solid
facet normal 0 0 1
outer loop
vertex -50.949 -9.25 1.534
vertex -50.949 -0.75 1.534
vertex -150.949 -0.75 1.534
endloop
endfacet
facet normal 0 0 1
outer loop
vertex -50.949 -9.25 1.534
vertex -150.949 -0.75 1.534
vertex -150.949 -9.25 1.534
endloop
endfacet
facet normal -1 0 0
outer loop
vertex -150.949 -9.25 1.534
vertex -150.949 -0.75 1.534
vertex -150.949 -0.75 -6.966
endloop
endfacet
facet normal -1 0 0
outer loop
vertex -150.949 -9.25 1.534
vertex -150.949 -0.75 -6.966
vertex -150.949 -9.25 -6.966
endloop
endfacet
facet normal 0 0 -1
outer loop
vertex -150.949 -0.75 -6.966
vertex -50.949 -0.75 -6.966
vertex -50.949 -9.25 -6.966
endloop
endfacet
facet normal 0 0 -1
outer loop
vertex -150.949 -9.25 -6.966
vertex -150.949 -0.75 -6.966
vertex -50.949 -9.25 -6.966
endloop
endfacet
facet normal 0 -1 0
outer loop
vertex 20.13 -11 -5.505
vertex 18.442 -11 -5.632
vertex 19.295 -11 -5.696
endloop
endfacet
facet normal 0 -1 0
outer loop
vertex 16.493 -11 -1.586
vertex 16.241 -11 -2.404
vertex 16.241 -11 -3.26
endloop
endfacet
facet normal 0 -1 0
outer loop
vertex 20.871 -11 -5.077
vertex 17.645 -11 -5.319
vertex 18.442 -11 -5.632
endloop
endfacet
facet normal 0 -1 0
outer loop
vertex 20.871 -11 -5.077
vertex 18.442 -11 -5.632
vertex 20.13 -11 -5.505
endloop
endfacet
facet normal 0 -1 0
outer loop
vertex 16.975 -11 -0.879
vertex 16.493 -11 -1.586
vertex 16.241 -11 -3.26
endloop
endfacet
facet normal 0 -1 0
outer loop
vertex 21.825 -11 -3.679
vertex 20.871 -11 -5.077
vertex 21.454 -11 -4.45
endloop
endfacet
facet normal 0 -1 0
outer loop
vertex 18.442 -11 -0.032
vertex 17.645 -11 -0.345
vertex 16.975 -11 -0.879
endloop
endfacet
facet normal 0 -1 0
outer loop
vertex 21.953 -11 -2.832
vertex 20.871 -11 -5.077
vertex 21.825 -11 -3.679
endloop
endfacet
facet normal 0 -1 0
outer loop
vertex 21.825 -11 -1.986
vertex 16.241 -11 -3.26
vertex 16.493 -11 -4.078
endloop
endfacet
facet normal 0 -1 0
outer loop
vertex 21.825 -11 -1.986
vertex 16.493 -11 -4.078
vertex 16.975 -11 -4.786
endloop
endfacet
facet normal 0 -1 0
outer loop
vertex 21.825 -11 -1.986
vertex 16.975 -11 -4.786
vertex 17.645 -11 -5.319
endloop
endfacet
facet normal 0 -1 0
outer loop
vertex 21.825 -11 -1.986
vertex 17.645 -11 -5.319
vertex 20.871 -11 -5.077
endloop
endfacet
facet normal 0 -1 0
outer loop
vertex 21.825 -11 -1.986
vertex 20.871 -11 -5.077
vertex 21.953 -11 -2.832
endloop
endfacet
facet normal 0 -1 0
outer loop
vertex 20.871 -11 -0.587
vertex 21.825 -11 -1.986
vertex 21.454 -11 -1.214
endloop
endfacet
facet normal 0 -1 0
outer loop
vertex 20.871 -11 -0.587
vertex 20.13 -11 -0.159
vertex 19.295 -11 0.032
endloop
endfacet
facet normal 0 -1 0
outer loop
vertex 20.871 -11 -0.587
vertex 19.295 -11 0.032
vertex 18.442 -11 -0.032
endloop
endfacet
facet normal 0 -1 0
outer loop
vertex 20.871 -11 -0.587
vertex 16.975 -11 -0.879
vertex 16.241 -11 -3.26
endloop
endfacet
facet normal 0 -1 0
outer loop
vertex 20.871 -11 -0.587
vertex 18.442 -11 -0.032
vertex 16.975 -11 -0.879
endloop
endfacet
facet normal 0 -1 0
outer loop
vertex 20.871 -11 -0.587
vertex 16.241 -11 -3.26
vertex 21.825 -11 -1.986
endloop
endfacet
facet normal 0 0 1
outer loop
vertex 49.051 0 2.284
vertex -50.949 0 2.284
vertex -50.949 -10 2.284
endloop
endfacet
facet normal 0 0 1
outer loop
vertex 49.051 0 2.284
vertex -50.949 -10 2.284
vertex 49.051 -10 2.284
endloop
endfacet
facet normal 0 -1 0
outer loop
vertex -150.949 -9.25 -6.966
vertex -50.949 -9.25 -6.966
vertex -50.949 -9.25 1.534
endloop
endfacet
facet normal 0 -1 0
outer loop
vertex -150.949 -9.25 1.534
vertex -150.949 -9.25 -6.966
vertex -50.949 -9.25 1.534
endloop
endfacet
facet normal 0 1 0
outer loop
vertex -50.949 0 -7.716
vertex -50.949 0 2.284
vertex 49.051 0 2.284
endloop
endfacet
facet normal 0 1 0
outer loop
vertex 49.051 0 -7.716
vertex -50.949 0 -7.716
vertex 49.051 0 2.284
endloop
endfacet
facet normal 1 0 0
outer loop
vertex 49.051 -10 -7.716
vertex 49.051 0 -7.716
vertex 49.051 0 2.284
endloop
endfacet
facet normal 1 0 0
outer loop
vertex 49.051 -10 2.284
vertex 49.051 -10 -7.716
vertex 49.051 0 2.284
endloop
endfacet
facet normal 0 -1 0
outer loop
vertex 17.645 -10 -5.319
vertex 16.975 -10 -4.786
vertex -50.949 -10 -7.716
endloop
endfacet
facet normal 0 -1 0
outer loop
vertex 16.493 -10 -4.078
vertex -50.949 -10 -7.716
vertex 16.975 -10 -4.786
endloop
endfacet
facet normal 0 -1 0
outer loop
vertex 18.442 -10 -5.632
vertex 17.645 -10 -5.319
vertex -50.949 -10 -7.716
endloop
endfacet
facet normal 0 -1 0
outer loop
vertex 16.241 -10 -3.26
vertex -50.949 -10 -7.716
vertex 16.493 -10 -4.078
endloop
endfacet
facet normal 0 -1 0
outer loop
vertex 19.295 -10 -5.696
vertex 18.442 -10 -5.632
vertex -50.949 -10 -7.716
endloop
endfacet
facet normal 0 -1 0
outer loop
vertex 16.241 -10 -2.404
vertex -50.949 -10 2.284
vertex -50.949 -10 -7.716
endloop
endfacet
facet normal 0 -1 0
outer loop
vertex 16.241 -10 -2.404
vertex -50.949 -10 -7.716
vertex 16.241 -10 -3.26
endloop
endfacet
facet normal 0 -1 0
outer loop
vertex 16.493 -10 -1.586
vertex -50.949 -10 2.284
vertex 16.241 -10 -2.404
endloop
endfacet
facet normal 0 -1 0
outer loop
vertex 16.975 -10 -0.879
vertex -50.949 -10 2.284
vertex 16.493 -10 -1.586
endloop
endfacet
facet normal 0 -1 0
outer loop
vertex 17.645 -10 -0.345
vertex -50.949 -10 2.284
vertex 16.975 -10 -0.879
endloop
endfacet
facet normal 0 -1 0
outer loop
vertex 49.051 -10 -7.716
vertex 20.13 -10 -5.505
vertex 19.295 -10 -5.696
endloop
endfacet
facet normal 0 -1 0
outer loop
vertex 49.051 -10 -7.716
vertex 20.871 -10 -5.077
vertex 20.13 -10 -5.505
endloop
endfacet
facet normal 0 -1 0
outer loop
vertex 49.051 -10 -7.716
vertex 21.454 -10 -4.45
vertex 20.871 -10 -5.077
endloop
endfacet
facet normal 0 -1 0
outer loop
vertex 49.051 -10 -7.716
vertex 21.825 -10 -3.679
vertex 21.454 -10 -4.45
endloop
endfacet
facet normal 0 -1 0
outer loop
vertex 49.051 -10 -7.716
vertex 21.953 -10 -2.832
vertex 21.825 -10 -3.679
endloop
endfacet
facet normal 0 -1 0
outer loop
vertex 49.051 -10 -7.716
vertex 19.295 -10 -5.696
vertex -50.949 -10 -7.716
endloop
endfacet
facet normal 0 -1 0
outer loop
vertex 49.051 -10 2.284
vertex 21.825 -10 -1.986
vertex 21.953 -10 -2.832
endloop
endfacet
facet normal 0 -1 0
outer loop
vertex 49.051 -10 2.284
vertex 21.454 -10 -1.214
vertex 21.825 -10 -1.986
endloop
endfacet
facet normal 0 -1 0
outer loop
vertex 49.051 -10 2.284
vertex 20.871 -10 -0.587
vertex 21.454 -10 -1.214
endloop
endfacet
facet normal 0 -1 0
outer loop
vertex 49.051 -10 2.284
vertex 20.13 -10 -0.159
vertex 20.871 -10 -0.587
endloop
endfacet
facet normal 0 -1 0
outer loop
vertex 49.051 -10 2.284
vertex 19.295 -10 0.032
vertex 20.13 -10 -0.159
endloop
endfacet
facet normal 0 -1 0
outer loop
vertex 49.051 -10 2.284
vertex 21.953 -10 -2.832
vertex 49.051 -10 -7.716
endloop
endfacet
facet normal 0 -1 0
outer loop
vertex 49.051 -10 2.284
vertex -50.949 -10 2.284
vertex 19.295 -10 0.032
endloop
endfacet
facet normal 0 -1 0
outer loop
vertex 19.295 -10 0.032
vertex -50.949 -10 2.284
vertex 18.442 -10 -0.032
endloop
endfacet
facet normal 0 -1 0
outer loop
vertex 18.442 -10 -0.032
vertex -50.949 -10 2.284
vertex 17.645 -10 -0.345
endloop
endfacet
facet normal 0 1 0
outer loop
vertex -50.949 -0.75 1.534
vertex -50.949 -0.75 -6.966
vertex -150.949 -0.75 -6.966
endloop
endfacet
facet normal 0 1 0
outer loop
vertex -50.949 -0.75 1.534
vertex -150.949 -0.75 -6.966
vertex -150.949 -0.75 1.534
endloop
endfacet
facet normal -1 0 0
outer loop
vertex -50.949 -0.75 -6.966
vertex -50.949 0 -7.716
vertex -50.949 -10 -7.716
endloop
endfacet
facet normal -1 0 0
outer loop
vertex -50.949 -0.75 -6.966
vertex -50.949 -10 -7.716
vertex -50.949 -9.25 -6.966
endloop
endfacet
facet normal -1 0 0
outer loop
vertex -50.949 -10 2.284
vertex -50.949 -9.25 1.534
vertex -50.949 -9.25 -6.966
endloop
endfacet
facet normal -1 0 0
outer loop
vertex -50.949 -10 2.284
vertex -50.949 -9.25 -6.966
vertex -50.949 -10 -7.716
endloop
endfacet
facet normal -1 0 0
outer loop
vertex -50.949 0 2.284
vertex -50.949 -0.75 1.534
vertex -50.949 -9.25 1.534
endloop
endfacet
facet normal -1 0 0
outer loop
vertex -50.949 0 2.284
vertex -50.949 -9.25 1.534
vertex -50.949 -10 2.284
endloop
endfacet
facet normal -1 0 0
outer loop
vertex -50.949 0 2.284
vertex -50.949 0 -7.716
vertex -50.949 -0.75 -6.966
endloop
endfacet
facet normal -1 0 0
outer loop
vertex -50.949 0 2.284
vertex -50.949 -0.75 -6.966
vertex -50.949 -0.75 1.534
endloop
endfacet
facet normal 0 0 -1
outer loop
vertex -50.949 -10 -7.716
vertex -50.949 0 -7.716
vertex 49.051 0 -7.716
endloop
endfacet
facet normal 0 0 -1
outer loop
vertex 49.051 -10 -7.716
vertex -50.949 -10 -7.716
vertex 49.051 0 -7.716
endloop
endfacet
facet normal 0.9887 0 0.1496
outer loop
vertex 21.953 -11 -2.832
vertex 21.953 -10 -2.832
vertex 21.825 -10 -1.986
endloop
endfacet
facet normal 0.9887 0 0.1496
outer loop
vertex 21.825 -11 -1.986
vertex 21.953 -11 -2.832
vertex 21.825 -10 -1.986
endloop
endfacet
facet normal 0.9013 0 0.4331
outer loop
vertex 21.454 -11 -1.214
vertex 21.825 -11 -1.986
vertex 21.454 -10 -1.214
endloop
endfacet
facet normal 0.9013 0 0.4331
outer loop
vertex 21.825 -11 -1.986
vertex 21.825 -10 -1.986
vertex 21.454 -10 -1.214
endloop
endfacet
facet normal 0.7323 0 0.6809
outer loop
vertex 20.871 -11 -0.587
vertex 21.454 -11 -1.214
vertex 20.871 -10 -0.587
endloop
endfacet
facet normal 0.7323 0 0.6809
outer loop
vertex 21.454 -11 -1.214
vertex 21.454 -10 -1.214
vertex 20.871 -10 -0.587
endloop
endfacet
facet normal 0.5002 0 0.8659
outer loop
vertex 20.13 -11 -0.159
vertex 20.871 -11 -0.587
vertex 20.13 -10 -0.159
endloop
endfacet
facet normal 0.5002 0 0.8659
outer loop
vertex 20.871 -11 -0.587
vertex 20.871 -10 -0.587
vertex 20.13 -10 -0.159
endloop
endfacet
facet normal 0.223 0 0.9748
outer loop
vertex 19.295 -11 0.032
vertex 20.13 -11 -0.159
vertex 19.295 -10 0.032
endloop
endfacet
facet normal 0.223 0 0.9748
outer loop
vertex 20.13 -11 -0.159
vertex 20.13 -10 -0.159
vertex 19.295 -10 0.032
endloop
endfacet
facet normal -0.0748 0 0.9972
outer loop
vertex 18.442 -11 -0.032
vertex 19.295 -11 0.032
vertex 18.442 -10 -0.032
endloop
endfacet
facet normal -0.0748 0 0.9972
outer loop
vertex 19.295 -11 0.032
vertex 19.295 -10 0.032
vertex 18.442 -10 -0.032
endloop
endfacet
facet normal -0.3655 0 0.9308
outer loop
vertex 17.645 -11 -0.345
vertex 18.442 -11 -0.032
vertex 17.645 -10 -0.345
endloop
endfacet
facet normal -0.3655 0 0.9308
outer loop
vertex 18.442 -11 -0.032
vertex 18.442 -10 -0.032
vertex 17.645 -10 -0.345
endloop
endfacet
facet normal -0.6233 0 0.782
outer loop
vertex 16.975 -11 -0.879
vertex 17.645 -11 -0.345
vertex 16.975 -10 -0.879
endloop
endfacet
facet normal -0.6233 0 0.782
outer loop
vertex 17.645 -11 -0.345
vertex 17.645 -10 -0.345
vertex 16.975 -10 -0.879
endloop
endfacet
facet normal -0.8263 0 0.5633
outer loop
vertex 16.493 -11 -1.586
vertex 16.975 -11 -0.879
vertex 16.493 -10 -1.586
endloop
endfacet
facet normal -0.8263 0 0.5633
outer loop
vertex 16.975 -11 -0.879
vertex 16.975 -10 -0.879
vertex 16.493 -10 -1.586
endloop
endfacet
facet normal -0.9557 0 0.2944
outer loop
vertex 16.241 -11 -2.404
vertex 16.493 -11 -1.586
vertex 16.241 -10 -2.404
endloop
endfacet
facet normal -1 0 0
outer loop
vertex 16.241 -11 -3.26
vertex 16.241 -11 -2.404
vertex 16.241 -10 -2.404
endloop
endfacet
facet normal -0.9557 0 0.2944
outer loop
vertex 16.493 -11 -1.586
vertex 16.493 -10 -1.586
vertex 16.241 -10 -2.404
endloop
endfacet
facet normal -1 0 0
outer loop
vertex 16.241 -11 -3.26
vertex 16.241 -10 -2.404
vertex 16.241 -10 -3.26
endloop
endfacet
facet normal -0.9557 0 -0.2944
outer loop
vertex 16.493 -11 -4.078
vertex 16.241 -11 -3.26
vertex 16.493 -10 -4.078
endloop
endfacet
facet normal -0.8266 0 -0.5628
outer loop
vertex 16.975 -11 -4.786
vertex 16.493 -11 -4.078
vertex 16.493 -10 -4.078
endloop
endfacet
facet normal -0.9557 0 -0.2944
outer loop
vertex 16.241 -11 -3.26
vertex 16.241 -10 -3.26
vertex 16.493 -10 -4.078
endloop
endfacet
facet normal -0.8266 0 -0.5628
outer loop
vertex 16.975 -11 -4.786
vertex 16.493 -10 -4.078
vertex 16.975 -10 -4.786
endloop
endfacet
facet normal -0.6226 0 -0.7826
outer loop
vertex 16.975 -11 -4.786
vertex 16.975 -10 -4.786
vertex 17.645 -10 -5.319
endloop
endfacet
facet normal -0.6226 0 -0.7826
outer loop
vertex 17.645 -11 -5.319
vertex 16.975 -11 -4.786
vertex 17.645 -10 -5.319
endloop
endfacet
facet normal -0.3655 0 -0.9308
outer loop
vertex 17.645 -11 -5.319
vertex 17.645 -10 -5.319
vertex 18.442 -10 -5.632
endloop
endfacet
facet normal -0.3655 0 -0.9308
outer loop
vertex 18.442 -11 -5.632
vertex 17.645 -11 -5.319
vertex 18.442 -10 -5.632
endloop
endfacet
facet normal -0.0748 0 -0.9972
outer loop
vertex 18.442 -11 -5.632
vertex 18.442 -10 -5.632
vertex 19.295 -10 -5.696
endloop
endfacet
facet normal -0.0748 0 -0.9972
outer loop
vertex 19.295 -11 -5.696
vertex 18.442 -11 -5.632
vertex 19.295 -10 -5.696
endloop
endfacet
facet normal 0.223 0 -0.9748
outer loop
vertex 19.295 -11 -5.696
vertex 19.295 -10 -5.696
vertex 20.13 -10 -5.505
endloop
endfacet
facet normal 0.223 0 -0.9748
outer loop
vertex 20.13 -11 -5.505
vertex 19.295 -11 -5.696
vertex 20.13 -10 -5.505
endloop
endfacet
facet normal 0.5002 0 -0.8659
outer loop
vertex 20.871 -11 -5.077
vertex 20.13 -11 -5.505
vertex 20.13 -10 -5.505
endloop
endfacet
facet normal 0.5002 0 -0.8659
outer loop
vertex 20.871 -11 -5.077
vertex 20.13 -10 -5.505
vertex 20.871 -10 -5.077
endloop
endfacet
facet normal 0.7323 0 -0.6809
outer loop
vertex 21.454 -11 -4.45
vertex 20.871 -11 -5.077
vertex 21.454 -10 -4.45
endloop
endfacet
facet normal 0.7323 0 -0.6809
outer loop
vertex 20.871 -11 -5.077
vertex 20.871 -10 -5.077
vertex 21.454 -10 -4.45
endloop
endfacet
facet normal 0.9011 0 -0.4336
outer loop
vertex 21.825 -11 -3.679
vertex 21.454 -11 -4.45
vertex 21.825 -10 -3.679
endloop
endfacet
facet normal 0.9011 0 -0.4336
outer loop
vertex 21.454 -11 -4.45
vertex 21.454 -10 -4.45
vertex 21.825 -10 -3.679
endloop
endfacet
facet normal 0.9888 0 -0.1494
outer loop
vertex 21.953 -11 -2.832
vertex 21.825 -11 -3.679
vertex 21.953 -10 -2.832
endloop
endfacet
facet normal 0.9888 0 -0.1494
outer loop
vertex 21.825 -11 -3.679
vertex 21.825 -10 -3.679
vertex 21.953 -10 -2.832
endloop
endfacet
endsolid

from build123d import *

# Parameters (mm, degrees)
F0_W     = 100
F0_H     = 10
F1_DEPTH = 10
F2_W     = 8.5
F2_H     = 8.5
F3_DEPTH = 100
F4_R     = 2.871916
F5_DEPTH = 1


with BuildPart() as f1:
    # F0 (on Front) → F1 (new body)
    with BuildSketch(Plane.XZ):
        with Locations((-0.948794, -2.716295)):
            Rectangle(F0_W, F0_H)
    extrude(amount=F1_DEPTH)

    # F2 (on face) → F3 (join)
    with BuildSketch(Plane(origin=(-50.948794, 0, 0), x_dir=(0, -1, 0), z_dir=(-1, 0, 0))):
        with Locations((5, -2.716295)):
            Rectangle(F2_W, F2_H)
    extrude(amount=F3_DEPTH)

    # F4 (on face) → F5 (join)
    with BuildSketch(Plane.XZ.offset(10)):
        with Locations((19.08073, -2.832106)):
            Circle(F4_R)
    extrude(amount=F5_DEPTH)


solid = f1.part
